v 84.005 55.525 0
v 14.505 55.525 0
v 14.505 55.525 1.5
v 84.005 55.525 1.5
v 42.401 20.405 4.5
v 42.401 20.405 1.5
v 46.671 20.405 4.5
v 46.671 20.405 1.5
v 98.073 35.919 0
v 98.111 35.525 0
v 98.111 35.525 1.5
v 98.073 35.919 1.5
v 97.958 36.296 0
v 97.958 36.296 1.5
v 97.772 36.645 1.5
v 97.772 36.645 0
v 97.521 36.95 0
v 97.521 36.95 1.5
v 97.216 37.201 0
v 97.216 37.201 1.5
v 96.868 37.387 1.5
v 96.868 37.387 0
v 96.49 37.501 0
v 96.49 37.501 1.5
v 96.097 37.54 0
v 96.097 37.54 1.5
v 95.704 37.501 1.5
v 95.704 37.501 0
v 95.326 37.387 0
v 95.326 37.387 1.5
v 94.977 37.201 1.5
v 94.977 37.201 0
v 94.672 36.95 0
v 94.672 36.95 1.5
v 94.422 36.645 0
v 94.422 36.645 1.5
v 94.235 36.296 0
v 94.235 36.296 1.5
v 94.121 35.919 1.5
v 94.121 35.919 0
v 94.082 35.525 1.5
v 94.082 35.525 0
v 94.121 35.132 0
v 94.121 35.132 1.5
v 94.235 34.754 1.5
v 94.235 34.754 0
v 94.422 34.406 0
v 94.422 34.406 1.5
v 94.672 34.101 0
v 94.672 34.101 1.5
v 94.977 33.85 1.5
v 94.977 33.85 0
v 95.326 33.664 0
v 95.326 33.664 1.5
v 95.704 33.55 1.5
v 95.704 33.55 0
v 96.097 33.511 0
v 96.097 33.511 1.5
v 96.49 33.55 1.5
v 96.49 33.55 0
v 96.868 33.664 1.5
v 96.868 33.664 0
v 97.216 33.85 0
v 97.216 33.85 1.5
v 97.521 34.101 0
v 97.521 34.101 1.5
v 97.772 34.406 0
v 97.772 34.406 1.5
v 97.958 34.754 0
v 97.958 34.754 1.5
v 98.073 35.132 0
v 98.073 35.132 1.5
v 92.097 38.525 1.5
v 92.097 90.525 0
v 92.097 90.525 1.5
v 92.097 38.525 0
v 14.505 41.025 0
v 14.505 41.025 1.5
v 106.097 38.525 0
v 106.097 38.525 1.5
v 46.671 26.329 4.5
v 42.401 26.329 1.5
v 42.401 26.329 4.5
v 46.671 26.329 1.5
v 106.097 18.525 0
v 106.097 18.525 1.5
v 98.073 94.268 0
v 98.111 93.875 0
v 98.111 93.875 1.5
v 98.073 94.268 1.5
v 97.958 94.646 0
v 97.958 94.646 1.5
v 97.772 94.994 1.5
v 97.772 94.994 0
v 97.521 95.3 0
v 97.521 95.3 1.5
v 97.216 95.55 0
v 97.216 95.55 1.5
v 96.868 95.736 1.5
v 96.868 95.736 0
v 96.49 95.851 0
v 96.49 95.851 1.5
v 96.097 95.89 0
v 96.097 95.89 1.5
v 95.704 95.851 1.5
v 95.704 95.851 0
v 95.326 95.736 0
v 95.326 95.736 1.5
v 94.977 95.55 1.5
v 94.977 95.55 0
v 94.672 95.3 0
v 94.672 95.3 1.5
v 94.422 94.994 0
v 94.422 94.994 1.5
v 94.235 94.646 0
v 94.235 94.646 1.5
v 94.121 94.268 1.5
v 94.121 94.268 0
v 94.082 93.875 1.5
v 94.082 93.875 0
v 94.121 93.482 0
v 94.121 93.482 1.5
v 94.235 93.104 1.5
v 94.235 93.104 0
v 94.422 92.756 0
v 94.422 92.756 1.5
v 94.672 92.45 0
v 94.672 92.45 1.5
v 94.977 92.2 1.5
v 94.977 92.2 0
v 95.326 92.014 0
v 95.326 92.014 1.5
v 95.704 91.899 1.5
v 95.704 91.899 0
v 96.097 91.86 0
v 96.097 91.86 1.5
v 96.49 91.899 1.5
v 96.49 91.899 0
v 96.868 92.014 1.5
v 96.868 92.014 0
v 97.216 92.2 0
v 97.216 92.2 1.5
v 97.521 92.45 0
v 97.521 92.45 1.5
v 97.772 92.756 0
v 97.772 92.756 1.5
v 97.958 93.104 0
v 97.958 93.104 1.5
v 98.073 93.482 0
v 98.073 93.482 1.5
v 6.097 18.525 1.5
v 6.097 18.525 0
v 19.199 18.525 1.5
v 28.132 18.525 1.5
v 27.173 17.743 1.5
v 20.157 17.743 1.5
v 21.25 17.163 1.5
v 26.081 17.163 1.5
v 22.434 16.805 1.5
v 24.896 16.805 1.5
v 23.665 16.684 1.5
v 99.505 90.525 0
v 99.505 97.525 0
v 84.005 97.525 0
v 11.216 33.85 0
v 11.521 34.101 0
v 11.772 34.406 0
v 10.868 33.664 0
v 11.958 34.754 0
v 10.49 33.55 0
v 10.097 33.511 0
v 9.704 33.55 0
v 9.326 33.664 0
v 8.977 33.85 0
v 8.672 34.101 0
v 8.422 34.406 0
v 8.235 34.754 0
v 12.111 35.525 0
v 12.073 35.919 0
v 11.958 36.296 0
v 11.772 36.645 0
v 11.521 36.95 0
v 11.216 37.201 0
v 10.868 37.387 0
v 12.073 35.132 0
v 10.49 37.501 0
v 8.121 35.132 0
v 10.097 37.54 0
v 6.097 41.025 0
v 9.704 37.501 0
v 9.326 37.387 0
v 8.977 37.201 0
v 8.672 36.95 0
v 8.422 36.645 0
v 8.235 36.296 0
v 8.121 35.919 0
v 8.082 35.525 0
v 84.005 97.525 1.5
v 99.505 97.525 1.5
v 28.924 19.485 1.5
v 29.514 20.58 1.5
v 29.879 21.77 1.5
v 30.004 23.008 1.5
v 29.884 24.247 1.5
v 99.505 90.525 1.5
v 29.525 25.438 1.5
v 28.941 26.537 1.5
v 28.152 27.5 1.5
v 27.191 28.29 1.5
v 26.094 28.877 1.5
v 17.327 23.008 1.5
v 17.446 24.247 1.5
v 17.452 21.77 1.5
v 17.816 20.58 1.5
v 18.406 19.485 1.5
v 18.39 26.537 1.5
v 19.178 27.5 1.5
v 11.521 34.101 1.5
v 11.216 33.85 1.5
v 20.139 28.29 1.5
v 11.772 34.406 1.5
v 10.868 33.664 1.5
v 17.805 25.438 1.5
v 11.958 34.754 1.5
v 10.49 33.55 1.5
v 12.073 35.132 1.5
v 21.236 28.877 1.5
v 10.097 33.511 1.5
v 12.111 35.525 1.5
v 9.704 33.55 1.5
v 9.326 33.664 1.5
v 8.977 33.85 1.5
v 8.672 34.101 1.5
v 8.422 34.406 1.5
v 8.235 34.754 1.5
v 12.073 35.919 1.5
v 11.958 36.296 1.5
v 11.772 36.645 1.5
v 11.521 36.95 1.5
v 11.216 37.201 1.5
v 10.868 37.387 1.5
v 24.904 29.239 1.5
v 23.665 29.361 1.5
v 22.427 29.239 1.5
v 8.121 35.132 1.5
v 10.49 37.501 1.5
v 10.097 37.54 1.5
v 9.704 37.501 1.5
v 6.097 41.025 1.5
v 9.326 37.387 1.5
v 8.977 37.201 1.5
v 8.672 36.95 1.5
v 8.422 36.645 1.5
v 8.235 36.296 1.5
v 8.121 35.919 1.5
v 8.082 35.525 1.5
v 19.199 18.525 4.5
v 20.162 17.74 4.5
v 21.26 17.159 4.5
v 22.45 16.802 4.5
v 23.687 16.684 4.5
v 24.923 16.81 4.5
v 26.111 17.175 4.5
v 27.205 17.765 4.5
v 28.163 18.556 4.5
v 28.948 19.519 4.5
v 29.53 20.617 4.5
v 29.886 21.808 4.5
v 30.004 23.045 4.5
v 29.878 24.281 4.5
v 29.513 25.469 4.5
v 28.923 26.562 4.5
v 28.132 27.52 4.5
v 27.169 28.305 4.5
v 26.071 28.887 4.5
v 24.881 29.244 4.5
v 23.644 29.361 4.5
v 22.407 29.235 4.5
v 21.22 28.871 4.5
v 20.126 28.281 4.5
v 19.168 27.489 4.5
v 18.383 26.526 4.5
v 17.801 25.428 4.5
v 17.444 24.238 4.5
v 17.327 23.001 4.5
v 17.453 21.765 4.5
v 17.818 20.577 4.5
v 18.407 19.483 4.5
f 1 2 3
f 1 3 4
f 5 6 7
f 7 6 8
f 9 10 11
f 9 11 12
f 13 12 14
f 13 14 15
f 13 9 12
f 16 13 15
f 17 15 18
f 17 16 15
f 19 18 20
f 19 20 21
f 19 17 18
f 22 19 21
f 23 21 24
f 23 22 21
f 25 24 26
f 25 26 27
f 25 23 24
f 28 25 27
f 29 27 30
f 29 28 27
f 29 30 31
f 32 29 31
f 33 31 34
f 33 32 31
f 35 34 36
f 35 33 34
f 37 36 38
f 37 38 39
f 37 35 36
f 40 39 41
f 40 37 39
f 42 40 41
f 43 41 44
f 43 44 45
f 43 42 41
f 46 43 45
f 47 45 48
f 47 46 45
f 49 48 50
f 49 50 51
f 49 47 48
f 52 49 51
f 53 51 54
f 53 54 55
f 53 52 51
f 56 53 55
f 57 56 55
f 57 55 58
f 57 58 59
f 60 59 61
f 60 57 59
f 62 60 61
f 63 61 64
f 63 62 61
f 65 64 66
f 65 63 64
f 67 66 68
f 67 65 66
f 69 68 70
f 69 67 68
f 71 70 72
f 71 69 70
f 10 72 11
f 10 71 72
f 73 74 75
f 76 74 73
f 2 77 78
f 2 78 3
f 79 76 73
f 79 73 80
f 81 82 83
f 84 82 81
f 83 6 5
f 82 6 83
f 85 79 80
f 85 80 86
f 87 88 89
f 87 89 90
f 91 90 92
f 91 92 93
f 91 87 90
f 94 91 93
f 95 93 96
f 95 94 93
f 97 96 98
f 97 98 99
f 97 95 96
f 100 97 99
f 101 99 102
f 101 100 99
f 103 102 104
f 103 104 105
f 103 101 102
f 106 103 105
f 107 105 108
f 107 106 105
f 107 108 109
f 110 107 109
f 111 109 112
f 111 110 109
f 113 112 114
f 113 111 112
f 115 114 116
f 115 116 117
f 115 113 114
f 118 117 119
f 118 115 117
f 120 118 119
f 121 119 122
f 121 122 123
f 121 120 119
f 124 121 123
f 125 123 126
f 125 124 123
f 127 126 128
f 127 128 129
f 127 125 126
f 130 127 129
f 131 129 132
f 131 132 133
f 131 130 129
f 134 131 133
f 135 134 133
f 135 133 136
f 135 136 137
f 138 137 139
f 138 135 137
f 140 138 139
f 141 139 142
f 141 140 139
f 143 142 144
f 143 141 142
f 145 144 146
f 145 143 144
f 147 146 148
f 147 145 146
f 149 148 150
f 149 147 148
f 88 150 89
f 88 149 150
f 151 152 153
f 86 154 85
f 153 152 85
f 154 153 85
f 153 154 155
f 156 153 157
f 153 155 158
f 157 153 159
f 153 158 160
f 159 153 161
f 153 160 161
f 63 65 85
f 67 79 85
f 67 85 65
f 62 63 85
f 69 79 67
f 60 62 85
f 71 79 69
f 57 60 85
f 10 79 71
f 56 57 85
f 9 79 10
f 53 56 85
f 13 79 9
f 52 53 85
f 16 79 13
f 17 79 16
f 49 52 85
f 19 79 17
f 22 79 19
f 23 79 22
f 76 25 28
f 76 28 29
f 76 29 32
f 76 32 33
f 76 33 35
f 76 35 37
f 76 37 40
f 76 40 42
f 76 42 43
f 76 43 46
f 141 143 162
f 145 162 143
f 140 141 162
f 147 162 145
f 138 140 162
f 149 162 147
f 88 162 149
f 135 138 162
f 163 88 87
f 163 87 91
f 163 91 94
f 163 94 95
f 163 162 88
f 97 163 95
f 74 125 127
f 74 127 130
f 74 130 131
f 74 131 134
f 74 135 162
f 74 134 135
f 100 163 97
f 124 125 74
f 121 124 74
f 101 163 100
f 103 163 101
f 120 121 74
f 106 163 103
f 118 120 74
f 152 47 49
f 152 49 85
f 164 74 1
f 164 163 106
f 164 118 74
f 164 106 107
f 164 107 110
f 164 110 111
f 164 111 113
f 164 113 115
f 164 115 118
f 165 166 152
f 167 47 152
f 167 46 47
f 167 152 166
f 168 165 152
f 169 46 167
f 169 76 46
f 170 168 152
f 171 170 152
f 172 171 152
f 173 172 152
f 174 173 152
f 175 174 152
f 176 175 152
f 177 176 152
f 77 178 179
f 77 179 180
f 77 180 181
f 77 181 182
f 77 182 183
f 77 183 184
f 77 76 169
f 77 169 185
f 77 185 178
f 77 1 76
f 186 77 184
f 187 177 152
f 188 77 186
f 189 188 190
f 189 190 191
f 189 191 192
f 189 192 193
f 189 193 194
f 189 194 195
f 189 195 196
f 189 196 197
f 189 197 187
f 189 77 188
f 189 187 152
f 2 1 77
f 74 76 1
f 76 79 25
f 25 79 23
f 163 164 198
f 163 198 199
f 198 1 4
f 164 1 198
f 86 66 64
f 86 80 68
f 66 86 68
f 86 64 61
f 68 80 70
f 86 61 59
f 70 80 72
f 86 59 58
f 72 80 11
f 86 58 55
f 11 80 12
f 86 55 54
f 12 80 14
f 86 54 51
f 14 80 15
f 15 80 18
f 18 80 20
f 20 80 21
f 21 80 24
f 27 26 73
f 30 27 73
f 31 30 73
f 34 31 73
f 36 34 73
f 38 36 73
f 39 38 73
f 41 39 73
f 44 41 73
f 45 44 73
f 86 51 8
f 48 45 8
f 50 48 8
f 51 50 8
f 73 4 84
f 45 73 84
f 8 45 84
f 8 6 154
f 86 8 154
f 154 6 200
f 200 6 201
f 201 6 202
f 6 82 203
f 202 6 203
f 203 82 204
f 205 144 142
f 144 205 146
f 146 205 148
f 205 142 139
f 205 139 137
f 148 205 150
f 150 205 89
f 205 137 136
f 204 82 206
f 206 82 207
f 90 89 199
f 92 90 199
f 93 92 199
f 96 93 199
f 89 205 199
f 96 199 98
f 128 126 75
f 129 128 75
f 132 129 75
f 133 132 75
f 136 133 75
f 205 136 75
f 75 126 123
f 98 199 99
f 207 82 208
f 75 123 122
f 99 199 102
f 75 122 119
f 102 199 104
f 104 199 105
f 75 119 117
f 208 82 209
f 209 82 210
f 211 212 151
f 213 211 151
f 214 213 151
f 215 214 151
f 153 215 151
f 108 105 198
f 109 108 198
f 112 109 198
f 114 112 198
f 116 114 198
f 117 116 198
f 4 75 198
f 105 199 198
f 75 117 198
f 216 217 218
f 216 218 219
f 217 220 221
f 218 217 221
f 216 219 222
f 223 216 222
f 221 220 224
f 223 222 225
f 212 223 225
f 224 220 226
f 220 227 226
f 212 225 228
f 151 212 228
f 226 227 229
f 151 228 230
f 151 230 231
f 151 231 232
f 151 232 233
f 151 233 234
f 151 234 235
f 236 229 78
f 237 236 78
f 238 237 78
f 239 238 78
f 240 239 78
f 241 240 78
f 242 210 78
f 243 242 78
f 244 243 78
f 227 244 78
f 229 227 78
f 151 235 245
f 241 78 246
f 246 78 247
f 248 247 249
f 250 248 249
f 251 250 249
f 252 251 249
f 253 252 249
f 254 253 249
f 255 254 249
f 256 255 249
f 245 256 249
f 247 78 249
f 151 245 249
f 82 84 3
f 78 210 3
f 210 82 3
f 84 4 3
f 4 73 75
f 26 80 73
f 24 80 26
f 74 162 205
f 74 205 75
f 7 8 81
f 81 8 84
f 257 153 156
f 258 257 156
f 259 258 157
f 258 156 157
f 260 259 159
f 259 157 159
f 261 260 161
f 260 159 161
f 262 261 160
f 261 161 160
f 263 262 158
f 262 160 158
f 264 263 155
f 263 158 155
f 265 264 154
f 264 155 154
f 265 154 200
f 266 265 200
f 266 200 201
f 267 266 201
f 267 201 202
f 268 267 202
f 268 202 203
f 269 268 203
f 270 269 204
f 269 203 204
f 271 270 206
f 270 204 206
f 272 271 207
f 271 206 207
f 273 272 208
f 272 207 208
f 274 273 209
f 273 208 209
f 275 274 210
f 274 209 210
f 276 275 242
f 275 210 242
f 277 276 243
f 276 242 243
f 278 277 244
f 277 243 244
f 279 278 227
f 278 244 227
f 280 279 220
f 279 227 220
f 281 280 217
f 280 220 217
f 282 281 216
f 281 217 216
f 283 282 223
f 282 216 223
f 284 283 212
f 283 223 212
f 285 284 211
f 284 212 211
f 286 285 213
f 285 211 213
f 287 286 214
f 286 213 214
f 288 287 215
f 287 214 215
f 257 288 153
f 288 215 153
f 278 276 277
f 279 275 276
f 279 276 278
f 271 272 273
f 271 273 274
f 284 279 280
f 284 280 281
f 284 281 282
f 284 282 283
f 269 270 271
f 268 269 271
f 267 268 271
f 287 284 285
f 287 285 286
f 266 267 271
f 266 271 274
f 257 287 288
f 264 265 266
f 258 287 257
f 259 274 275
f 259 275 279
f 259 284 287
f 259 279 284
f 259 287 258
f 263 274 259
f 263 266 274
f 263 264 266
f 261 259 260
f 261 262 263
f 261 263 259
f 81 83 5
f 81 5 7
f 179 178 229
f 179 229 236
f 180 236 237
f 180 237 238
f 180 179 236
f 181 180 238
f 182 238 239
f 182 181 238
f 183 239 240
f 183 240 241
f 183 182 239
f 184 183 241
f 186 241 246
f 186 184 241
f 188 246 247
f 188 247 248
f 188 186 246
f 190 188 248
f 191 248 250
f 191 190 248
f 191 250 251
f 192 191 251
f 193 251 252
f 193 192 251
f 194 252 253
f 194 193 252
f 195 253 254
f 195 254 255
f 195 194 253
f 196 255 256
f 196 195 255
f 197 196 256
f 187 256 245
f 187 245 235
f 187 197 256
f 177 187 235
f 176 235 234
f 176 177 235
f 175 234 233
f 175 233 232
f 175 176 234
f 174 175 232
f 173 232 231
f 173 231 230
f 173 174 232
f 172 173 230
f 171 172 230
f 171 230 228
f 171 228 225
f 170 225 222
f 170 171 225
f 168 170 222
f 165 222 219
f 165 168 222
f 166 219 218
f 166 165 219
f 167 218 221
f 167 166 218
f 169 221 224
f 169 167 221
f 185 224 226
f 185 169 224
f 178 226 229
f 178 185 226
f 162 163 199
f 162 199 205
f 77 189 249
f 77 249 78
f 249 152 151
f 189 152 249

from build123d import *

# Parameters (mm, degrees)
SKETCH1_R           = 2.014647572
BOSS_EXTRUDE1_DEPTH = 1.5
SKETCH2_R           = 6.338534982
SKETCH2_W           = 4.270612397
SKETCH2_H           = 5.923752679
BOSS_EXTRUDE2_DEPTH = 3


with BuildPart() as part:
    # Sketch1 → Boss-Extrude1 (new body)
    with BuildSketch(Plane.XY):
        Polygon((6.096678716, 18.525469925), (6.096678716, 41.025469925), (14.504757975, 41.025469925), (14.504757975, 55.525469925), (84.004757975, 55.525469925), (84.004757975, 97.525469925), (99.504757975, 97.525469925), (99.504757975, 90.525469925), (92.096678716, 90.525469925), (92.096678716, 38.525469925), (106.096678716, 38.525469925), (106.096678716, 18.525469925), (70.532495119, 18.525469925), align=None)
        with Locations((96.096678716, 35.525469925)):
            Circle(SKETCH1_R, mode=Mode.SUBTRACT)
        with Locations((96.096678716, 93.874977547)):
            Circle(SKETCH1_R, mode=Mode.SUBTRACT)
        with Locations((10.096678716, 35.525469925)):
            Circle(SKETCH1_R, mode=Mode.SUBTRACT)
    extrude(amount=BOSS_EXTRUDE1_DEPTH)

    # Sketch2 → Boss-Extrude2 (add)
    with BuildSketch(Plane.XY.offset(1.5)):
        with Locations(Location((23.665238751, 23.02282619, 0), (0, 0, 225.19637393))):
            Circle(SKETCH2_R)
        with Locations((44.536134816, 23.367230416)):
            Rectangle(SKETCH2_W, SKETCH2_H)
    extrude(amount=BOSS_EXTRUDE2_DEPTH)


solid = part.part
